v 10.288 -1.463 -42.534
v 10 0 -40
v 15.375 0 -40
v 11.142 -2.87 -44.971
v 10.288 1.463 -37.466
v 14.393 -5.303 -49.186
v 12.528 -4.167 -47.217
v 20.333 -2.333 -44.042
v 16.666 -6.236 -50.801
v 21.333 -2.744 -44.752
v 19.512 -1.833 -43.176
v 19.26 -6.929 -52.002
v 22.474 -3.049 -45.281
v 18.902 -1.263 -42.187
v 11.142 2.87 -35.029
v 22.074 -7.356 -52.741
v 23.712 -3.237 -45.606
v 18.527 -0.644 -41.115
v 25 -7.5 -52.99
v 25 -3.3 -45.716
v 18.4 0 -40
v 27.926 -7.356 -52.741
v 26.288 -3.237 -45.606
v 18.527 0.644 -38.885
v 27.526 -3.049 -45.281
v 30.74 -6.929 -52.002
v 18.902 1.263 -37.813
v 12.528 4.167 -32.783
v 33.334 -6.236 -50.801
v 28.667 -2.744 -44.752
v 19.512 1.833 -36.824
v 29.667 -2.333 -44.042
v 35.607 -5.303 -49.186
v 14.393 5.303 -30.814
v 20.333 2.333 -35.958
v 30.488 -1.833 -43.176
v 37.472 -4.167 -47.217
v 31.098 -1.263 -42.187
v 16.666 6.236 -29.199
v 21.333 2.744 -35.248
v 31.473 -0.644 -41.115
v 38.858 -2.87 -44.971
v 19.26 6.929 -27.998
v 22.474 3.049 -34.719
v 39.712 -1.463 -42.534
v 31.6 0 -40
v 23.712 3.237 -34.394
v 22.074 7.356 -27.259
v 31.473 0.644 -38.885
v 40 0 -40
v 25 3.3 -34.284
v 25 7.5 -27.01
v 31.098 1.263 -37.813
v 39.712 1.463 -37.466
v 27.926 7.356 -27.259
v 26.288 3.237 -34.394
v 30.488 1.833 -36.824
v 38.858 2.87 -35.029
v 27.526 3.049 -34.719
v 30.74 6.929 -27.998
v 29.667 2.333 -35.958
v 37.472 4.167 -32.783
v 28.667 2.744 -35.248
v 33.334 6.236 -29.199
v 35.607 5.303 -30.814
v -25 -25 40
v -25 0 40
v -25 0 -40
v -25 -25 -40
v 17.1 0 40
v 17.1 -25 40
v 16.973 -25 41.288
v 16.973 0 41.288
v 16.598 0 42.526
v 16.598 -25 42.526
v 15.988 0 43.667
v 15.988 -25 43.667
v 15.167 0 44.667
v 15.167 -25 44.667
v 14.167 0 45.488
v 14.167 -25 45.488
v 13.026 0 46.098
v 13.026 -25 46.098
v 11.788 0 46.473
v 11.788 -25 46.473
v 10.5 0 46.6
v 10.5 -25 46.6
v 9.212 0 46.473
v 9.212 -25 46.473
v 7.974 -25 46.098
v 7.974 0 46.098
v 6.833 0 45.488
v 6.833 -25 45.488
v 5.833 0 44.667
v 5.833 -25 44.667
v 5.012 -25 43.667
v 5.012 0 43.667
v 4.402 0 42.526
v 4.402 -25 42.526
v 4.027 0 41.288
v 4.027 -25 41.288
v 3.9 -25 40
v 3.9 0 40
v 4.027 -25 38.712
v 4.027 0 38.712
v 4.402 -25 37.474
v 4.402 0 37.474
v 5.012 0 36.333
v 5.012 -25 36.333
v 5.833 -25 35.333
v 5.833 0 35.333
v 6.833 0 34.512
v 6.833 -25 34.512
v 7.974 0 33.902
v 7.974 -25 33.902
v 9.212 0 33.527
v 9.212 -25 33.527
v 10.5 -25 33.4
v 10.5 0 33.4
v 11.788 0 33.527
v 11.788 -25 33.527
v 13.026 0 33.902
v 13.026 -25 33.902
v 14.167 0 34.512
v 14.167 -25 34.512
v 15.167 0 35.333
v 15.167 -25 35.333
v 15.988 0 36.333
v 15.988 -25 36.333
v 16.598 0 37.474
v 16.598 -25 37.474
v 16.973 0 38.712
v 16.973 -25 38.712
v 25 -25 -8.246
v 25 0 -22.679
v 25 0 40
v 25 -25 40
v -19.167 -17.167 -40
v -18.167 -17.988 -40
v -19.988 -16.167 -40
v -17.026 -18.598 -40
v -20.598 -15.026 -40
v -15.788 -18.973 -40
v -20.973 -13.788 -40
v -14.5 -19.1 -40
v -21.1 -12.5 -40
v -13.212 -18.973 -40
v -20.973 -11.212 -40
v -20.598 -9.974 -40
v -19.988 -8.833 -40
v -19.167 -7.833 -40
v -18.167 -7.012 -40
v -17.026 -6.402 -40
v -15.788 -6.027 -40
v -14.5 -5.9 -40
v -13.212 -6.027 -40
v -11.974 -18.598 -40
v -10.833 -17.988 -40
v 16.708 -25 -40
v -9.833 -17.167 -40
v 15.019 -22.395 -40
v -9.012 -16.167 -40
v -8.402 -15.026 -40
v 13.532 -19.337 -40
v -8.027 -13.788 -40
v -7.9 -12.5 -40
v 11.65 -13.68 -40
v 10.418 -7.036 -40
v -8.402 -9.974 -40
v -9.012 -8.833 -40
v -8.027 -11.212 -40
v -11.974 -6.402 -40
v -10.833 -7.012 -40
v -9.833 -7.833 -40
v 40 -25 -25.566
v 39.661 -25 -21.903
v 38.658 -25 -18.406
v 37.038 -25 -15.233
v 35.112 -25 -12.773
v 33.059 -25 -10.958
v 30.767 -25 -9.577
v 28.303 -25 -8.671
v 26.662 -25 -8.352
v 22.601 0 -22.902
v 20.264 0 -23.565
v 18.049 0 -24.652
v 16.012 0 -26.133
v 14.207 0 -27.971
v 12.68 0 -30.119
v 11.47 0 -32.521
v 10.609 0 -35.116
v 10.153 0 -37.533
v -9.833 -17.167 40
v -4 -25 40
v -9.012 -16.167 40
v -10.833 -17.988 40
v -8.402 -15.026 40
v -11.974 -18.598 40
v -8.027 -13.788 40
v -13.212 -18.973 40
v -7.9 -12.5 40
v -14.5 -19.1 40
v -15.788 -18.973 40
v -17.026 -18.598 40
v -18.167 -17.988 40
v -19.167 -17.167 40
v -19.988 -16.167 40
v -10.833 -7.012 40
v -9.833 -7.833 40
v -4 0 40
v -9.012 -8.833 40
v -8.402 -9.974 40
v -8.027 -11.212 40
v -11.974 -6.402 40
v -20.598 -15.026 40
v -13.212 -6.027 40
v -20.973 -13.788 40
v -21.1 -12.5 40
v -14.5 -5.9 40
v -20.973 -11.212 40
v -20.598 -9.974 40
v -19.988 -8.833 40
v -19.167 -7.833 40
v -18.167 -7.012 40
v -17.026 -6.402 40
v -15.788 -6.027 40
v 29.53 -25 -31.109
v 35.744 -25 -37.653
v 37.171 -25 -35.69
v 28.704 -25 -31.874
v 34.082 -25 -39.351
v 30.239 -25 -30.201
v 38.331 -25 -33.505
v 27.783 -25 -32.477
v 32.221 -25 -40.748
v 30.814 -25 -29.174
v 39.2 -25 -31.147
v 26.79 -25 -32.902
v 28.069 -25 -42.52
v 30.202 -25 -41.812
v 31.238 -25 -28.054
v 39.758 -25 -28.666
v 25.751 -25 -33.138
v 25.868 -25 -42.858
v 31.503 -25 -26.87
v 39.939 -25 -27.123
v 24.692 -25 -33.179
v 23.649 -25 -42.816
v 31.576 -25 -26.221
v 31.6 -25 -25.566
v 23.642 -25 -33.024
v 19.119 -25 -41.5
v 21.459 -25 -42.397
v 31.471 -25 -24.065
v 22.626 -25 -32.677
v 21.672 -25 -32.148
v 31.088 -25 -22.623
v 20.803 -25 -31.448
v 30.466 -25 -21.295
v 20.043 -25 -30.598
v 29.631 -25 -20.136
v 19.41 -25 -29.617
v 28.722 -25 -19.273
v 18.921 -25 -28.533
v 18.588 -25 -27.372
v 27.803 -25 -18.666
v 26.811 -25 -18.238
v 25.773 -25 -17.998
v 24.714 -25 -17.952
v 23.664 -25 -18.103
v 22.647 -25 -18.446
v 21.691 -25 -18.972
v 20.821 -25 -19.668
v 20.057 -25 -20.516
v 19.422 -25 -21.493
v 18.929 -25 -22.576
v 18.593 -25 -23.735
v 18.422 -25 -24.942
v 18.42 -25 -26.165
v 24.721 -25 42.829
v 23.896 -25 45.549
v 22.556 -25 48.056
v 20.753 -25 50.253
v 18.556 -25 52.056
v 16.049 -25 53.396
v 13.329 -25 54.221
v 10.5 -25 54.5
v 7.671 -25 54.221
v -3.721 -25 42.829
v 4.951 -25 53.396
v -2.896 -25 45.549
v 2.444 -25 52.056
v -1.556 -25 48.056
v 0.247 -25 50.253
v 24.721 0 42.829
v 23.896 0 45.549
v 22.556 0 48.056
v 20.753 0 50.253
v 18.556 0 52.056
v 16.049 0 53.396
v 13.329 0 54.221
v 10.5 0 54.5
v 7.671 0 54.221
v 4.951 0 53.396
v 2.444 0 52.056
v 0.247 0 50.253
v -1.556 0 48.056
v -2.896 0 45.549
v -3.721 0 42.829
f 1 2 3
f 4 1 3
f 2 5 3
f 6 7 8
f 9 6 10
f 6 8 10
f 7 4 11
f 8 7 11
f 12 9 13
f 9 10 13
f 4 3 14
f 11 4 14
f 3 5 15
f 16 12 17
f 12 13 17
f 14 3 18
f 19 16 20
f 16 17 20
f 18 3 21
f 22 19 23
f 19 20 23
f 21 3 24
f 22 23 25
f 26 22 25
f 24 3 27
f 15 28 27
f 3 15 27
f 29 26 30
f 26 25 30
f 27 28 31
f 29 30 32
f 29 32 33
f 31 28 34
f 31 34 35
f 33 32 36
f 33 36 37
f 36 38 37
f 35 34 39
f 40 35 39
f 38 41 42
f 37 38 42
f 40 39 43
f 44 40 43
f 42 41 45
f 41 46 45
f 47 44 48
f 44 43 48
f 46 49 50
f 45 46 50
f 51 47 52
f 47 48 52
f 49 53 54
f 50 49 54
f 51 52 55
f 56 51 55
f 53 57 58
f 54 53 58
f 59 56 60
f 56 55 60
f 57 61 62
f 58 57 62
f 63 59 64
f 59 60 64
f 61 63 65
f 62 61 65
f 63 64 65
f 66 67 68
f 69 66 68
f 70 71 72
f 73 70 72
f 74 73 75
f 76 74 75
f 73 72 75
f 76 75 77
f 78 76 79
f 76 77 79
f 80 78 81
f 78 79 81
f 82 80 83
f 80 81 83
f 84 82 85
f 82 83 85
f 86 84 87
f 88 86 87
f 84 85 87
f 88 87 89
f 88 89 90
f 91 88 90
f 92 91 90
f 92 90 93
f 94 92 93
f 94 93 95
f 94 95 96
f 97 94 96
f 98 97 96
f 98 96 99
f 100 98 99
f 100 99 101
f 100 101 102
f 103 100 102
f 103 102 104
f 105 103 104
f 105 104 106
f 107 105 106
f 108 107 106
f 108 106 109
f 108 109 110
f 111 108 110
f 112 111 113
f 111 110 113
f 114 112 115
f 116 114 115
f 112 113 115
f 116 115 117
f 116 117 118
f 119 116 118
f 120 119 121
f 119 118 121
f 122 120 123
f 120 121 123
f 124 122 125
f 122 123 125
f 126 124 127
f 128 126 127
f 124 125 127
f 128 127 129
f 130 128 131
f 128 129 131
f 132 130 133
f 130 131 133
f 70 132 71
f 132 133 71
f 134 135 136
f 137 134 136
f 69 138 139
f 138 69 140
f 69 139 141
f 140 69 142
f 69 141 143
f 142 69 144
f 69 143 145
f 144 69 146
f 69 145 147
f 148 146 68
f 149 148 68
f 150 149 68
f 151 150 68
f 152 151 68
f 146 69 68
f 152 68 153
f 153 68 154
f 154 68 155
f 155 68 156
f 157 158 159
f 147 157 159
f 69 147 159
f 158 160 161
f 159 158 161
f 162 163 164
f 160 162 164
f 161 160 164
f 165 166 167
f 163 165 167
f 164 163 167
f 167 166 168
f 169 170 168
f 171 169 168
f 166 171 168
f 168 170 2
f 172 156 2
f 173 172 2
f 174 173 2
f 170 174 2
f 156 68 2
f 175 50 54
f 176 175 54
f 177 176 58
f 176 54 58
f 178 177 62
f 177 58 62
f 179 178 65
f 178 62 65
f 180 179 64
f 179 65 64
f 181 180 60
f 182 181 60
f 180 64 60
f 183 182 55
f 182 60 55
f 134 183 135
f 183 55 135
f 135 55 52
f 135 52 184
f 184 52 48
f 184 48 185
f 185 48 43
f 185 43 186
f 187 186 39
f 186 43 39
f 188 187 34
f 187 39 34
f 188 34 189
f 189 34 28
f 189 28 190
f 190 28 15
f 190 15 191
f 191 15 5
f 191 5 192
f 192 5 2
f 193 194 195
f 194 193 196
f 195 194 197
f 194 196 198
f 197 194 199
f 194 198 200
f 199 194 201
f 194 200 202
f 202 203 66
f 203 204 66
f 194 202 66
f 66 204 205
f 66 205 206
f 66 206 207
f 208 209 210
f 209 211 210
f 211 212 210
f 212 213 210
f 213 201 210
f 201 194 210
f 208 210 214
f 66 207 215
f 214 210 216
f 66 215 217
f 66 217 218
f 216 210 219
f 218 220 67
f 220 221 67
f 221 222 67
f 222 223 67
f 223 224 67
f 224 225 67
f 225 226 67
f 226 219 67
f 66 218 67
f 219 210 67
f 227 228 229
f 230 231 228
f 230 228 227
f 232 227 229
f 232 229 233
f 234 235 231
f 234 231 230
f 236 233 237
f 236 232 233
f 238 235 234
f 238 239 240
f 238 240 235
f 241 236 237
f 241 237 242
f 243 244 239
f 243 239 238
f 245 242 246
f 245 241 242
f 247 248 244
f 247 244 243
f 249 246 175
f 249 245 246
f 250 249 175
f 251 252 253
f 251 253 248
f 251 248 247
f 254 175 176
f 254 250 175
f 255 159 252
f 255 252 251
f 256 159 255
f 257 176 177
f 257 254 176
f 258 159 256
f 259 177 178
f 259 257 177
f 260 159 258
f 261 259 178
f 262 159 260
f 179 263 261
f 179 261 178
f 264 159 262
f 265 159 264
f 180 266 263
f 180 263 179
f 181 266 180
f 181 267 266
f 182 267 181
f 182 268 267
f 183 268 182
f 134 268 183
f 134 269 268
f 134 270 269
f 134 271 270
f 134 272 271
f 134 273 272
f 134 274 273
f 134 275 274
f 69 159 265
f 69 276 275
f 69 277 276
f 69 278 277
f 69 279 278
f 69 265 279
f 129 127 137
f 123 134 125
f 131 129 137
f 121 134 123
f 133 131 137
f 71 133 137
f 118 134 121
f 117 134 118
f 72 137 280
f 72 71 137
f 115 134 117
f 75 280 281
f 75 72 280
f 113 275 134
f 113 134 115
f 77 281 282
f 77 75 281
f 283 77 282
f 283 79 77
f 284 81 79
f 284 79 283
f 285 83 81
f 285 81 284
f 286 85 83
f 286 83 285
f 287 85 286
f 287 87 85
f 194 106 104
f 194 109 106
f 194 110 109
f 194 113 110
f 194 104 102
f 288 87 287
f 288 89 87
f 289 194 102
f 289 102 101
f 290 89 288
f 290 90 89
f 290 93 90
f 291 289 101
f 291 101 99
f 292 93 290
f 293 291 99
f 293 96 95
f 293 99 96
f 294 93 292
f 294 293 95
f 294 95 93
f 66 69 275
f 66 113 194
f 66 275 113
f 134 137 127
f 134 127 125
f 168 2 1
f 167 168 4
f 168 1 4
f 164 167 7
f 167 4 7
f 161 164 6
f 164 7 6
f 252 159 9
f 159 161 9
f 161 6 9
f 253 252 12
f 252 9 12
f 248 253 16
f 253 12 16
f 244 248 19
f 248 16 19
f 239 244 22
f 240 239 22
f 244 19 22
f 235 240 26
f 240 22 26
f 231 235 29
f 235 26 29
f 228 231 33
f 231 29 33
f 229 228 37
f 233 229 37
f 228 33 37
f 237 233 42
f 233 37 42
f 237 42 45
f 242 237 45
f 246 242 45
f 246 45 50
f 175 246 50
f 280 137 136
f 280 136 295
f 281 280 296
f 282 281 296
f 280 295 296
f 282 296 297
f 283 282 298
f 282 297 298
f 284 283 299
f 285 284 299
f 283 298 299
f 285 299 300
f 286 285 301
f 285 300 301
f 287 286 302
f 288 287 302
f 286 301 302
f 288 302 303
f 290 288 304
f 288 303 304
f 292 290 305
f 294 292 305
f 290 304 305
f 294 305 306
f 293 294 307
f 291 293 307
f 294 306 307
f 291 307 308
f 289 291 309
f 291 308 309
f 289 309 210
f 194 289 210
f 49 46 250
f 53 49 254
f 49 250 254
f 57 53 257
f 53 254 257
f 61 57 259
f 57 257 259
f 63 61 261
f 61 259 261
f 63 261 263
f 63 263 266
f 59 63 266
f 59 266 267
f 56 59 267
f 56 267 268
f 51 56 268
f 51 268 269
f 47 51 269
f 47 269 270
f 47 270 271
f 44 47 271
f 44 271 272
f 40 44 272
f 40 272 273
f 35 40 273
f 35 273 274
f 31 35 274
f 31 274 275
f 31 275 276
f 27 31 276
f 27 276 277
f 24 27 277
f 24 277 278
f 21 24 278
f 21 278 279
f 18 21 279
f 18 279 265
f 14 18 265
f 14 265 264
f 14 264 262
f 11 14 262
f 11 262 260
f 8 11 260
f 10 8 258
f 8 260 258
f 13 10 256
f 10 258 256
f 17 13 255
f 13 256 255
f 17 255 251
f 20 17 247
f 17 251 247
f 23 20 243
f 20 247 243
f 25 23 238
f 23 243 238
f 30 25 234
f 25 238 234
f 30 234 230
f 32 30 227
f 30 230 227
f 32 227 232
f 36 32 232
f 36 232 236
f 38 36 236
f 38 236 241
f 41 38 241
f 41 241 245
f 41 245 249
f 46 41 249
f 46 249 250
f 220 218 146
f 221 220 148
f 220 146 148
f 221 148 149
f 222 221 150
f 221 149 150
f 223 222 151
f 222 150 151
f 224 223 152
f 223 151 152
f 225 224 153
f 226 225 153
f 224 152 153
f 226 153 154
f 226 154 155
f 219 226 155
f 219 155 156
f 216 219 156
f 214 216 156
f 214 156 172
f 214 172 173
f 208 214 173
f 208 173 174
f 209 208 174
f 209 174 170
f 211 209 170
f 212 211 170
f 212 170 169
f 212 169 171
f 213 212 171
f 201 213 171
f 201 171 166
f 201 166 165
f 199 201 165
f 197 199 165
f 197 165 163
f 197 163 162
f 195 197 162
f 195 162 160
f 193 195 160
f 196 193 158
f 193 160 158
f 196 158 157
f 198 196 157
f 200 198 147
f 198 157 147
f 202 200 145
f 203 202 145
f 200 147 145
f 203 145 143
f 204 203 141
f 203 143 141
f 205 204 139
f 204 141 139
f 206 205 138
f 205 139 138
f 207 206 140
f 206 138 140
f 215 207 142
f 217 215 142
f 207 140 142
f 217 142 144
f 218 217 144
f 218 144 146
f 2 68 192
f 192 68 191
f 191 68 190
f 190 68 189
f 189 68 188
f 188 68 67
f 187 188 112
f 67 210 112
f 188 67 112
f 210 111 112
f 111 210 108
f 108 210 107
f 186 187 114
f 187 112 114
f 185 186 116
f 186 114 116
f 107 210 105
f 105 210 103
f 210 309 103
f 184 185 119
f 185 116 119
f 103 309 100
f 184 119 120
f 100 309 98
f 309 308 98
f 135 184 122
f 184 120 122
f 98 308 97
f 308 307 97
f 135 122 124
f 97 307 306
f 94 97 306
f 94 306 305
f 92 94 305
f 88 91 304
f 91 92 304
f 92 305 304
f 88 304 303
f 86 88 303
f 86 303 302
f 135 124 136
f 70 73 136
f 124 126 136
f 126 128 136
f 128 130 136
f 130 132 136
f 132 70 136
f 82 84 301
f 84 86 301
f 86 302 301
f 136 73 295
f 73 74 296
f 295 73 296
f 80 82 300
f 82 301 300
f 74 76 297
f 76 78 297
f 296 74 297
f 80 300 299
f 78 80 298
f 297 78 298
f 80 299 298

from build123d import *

# Parameters (mm, degrees)
F1_DEPTH        = 25
F3_R            = 15
F4_DEPTH        = 52
F6_D            = 13.2
F6_CBORE_D      = 19.25
F6_CBORE_DEPTH  = 0
F8_D            = 13.2
F8_CBORE_D      = 19.25
F8_CBORE_DEPTH  = 0
F10_D           = 13.2
F10_CBORE_D     = 19.25
F10_CBORE_DEPTH = 0
F11_W           = 35.8968544751
F11_H           = 52.9583077878
F12_DEPTH       = 58


with BuildPart() as f1:
    # F0 (on Front) → F1 (new body)
    with BuildSketch(Plane.XZ):
        with BuildLine():
            Line((-25, -40), (25, -40))
            Line((25, -40), (25, 40))
            ThreePointArc((25, 40), (10.5, 25.5), (-4, 40))
            Line((-4, 40), (-25, 40))
            Line((-25, 40), (-25, -40))
        make_face()
        with BuildLine():
            ThreePointArc((-4, 40), (10.5, 25.5), (25, 40))
            Line((25, 40), (-4, 40))
        make_face()
        with BuildLine():
            Line((-4, 40), (25, 40))
            ThreePointArc((25, 40), (10.5, 54.5), (-4, 40))
        make_face()
    extrude(amount=F1_DEPTH)

    # F3 (on face) → F4 (join)
    with BuildSketch(Plane(origin=(0, 17.3205080757, -10), x_dir=(1, 0, 0), z_dir=(0, -0.8660254038, 0.5))):
        with Locations((25, -34.6410161514)):
            Circle(F3_R)
    extrude(amount=F4_DEPTH)

    # F6 (through all)
    with Locations(Plane(origin=(0, 17.3205080757, -10), x_dir=(-1, 0, 0), z_dir=(0, 0.8660254038, -0.5))):
        with Locations((-25, -34.6410161514)):
            CounterBoreHole(F6_D / 2, F6_CBORE_D / 2, F6_CBORE_DEPTH)

    # F8 (through all)
    with Locations(Plane(origin=(0, 0, 0), x_dir=(-1, 0, 0), z_dir=(0, 1, 0))):
        with Locations((-10.5, 40)):
            CounterBoreHole(F8_D / 2, F8_CBORE_D / 2, F8_CBORE_DEPTH)

    # F10 (through all)
    with Locations(Plane.XY.offset(40)):
        with Locations((-14.5, -12.5)):
            CounterBoreHole(F10_D / 2, F10_CBORE_D / 2, F10_CBORE_DEPTH)

    # F11 (on Right) → F12 (cut)
    with BuildSketch(Plane.YZ):
        with Locations((-42.9484272376, -22.4903533235)):
            Rectangle(F11_W, F11_H)
    extrude(amount=F12_DEPTH, mode=Mode.SUBTRACT)


solid = f1.part
